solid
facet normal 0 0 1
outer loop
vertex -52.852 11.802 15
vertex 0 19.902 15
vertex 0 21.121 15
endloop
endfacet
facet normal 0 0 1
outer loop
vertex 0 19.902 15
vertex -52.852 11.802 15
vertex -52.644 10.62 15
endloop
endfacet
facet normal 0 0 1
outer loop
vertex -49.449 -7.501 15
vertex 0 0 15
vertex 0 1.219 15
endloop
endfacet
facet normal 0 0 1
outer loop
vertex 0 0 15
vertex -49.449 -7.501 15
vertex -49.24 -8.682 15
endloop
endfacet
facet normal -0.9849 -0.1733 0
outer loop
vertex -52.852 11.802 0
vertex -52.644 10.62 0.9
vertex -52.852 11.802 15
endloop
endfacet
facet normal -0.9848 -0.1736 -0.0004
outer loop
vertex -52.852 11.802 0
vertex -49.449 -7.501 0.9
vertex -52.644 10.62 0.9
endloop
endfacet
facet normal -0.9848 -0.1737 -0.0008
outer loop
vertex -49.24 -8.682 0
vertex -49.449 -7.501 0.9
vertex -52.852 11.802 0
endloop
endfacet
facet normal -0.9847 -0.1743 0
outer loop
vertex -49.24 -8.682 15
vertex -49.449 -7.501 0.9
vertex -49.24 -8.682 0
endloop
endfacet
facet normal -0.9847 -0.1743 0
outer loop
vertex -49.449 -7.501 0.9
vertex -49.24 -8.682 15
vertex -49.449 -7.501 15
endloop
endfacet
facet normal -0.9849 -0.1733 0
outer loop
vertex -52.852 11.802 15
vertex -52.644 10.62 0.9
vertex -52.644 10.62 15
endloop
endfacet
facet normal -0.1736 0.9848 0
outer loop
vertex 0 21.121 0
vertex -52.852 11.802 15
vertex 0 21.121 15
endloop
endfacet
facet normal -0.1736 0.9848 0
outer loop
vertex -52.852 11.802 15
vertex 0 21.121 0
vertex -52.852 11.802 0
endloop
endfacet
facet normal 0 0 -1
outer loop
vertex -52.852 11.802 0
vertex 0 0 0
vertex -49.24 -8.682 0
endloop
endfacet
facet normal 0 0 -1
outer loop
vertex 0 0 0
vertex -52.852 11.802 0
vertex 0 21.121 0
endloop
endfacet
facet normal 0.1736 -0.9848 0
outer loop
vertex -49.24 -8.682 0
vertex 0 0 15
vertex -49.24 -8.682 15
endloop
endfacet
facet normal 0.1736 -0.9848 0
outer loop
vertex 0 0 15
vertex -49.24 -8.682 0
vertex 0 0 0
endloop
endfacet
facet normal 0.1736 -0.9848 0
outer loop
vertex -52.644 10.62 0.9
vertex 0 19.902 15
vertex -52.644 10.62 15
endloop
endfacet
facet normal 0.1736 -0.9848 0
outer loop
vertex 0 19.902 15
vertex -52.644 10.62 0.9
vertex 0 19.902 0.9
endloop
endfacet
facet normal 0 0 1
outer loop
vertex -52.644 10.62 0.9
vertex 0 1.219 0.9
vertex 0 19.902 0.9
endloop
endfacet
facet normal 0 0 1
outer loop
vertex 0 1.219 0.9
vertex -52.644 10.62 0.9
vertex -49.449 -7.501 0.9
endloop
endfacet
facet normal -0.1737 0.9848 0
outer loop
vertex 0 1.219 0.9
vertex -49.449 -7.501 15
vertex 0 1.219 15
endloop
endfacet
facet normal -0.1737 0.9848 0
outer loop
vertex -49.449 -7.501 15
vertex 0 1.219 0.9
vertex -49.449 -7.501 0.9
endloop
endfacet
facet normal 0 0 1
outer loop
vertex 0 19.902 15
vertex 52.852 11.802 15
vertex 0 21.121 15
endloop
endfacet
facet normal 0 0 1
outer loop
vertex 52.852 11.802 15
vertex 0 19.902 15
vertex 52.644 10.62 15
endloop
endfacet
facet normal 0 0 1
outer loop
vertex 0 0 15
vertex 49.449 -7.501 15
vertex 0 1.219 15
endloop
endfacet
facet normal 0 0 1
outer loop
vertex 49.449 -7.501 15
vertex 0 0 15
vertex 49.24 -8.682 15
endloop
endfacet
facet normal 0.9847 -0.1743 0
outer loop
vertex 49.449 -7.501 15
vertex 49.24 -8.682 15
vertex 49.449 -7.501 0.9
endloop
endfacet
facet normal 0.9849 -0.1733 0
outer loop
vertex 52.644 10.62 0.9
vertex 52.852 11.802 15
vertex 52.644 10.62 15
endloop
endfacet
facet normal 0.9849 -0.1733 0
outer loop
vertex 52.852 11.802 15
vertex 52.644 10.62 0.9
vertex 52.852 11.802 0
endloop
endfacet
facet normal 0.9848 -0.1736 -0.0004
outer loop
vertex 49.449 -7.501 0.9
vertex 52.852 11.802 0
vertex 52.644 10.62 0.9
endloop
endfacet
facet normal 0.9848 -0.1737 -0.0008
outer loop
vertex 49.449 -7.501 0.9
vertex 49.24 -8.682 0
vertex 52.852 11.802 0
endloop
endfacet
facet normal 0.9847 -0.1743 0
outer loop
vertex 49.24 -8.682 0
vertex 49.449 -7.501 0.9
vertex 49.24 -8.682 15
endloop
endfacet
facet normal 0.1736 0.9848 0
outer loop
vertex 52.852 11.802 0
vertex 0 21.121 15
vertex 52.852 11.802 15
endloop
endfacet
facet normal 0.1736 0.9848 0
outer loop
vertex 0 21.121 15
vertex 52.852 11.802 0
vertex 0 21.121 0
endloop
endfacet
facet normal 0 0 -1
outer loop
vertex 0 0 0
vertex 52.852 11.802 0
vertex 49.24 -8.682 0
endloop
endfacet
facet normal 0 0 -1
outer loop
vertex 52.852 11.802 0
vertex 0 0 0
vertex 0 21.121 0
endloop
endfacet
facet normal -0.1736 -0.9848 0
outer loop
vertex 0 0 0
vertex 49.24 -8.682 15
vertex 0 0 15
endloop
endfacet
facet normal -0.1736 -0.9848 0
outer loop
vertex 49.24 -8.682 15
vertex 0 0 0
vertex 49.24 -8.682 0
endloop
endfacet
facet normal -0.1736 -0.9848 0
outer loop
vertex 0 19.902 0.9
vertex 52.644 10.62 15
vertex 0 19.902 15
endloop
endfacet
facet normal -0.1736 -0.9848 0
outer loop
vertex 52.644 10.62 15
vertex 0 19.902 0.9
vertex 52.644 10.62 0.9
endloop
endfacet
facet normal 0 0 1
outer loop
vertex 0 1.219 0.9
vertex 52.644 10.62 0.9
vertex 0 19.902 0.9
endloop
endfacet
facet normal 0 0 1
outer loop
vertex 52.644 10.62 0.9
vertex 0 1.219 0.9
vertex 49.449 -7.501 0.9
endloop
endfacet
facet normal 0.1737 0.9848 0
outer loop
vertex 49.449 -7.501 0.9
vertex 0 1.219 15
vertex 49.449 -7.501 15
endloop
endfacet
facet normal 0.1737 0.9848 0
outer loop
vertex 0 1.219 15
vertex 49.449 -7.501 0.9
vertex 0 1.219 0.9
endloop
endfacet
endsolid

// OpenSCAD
/********************************************************
                 MonitorUnion
                 LordRaven 2017
                      v1.0
*********************************************************/


/***************************************
                Modules
****************************************/

module Side()
{
    difference()
    {
        difference()
        {
            rotate(10)
                translate([-50,0,0])
                    cube([60,20.8,15]);

            rotate(10)
                translate([-55,1.2,.9])
                    cube([70,18.4,15]);
        }
        color("green", 0.5)
        translate([0,-1,-1])
            cube([10,25,20]);

    }
}


/***************************************
                Main
****************************************/

Side();
mirror([1,0,0])
Side();
